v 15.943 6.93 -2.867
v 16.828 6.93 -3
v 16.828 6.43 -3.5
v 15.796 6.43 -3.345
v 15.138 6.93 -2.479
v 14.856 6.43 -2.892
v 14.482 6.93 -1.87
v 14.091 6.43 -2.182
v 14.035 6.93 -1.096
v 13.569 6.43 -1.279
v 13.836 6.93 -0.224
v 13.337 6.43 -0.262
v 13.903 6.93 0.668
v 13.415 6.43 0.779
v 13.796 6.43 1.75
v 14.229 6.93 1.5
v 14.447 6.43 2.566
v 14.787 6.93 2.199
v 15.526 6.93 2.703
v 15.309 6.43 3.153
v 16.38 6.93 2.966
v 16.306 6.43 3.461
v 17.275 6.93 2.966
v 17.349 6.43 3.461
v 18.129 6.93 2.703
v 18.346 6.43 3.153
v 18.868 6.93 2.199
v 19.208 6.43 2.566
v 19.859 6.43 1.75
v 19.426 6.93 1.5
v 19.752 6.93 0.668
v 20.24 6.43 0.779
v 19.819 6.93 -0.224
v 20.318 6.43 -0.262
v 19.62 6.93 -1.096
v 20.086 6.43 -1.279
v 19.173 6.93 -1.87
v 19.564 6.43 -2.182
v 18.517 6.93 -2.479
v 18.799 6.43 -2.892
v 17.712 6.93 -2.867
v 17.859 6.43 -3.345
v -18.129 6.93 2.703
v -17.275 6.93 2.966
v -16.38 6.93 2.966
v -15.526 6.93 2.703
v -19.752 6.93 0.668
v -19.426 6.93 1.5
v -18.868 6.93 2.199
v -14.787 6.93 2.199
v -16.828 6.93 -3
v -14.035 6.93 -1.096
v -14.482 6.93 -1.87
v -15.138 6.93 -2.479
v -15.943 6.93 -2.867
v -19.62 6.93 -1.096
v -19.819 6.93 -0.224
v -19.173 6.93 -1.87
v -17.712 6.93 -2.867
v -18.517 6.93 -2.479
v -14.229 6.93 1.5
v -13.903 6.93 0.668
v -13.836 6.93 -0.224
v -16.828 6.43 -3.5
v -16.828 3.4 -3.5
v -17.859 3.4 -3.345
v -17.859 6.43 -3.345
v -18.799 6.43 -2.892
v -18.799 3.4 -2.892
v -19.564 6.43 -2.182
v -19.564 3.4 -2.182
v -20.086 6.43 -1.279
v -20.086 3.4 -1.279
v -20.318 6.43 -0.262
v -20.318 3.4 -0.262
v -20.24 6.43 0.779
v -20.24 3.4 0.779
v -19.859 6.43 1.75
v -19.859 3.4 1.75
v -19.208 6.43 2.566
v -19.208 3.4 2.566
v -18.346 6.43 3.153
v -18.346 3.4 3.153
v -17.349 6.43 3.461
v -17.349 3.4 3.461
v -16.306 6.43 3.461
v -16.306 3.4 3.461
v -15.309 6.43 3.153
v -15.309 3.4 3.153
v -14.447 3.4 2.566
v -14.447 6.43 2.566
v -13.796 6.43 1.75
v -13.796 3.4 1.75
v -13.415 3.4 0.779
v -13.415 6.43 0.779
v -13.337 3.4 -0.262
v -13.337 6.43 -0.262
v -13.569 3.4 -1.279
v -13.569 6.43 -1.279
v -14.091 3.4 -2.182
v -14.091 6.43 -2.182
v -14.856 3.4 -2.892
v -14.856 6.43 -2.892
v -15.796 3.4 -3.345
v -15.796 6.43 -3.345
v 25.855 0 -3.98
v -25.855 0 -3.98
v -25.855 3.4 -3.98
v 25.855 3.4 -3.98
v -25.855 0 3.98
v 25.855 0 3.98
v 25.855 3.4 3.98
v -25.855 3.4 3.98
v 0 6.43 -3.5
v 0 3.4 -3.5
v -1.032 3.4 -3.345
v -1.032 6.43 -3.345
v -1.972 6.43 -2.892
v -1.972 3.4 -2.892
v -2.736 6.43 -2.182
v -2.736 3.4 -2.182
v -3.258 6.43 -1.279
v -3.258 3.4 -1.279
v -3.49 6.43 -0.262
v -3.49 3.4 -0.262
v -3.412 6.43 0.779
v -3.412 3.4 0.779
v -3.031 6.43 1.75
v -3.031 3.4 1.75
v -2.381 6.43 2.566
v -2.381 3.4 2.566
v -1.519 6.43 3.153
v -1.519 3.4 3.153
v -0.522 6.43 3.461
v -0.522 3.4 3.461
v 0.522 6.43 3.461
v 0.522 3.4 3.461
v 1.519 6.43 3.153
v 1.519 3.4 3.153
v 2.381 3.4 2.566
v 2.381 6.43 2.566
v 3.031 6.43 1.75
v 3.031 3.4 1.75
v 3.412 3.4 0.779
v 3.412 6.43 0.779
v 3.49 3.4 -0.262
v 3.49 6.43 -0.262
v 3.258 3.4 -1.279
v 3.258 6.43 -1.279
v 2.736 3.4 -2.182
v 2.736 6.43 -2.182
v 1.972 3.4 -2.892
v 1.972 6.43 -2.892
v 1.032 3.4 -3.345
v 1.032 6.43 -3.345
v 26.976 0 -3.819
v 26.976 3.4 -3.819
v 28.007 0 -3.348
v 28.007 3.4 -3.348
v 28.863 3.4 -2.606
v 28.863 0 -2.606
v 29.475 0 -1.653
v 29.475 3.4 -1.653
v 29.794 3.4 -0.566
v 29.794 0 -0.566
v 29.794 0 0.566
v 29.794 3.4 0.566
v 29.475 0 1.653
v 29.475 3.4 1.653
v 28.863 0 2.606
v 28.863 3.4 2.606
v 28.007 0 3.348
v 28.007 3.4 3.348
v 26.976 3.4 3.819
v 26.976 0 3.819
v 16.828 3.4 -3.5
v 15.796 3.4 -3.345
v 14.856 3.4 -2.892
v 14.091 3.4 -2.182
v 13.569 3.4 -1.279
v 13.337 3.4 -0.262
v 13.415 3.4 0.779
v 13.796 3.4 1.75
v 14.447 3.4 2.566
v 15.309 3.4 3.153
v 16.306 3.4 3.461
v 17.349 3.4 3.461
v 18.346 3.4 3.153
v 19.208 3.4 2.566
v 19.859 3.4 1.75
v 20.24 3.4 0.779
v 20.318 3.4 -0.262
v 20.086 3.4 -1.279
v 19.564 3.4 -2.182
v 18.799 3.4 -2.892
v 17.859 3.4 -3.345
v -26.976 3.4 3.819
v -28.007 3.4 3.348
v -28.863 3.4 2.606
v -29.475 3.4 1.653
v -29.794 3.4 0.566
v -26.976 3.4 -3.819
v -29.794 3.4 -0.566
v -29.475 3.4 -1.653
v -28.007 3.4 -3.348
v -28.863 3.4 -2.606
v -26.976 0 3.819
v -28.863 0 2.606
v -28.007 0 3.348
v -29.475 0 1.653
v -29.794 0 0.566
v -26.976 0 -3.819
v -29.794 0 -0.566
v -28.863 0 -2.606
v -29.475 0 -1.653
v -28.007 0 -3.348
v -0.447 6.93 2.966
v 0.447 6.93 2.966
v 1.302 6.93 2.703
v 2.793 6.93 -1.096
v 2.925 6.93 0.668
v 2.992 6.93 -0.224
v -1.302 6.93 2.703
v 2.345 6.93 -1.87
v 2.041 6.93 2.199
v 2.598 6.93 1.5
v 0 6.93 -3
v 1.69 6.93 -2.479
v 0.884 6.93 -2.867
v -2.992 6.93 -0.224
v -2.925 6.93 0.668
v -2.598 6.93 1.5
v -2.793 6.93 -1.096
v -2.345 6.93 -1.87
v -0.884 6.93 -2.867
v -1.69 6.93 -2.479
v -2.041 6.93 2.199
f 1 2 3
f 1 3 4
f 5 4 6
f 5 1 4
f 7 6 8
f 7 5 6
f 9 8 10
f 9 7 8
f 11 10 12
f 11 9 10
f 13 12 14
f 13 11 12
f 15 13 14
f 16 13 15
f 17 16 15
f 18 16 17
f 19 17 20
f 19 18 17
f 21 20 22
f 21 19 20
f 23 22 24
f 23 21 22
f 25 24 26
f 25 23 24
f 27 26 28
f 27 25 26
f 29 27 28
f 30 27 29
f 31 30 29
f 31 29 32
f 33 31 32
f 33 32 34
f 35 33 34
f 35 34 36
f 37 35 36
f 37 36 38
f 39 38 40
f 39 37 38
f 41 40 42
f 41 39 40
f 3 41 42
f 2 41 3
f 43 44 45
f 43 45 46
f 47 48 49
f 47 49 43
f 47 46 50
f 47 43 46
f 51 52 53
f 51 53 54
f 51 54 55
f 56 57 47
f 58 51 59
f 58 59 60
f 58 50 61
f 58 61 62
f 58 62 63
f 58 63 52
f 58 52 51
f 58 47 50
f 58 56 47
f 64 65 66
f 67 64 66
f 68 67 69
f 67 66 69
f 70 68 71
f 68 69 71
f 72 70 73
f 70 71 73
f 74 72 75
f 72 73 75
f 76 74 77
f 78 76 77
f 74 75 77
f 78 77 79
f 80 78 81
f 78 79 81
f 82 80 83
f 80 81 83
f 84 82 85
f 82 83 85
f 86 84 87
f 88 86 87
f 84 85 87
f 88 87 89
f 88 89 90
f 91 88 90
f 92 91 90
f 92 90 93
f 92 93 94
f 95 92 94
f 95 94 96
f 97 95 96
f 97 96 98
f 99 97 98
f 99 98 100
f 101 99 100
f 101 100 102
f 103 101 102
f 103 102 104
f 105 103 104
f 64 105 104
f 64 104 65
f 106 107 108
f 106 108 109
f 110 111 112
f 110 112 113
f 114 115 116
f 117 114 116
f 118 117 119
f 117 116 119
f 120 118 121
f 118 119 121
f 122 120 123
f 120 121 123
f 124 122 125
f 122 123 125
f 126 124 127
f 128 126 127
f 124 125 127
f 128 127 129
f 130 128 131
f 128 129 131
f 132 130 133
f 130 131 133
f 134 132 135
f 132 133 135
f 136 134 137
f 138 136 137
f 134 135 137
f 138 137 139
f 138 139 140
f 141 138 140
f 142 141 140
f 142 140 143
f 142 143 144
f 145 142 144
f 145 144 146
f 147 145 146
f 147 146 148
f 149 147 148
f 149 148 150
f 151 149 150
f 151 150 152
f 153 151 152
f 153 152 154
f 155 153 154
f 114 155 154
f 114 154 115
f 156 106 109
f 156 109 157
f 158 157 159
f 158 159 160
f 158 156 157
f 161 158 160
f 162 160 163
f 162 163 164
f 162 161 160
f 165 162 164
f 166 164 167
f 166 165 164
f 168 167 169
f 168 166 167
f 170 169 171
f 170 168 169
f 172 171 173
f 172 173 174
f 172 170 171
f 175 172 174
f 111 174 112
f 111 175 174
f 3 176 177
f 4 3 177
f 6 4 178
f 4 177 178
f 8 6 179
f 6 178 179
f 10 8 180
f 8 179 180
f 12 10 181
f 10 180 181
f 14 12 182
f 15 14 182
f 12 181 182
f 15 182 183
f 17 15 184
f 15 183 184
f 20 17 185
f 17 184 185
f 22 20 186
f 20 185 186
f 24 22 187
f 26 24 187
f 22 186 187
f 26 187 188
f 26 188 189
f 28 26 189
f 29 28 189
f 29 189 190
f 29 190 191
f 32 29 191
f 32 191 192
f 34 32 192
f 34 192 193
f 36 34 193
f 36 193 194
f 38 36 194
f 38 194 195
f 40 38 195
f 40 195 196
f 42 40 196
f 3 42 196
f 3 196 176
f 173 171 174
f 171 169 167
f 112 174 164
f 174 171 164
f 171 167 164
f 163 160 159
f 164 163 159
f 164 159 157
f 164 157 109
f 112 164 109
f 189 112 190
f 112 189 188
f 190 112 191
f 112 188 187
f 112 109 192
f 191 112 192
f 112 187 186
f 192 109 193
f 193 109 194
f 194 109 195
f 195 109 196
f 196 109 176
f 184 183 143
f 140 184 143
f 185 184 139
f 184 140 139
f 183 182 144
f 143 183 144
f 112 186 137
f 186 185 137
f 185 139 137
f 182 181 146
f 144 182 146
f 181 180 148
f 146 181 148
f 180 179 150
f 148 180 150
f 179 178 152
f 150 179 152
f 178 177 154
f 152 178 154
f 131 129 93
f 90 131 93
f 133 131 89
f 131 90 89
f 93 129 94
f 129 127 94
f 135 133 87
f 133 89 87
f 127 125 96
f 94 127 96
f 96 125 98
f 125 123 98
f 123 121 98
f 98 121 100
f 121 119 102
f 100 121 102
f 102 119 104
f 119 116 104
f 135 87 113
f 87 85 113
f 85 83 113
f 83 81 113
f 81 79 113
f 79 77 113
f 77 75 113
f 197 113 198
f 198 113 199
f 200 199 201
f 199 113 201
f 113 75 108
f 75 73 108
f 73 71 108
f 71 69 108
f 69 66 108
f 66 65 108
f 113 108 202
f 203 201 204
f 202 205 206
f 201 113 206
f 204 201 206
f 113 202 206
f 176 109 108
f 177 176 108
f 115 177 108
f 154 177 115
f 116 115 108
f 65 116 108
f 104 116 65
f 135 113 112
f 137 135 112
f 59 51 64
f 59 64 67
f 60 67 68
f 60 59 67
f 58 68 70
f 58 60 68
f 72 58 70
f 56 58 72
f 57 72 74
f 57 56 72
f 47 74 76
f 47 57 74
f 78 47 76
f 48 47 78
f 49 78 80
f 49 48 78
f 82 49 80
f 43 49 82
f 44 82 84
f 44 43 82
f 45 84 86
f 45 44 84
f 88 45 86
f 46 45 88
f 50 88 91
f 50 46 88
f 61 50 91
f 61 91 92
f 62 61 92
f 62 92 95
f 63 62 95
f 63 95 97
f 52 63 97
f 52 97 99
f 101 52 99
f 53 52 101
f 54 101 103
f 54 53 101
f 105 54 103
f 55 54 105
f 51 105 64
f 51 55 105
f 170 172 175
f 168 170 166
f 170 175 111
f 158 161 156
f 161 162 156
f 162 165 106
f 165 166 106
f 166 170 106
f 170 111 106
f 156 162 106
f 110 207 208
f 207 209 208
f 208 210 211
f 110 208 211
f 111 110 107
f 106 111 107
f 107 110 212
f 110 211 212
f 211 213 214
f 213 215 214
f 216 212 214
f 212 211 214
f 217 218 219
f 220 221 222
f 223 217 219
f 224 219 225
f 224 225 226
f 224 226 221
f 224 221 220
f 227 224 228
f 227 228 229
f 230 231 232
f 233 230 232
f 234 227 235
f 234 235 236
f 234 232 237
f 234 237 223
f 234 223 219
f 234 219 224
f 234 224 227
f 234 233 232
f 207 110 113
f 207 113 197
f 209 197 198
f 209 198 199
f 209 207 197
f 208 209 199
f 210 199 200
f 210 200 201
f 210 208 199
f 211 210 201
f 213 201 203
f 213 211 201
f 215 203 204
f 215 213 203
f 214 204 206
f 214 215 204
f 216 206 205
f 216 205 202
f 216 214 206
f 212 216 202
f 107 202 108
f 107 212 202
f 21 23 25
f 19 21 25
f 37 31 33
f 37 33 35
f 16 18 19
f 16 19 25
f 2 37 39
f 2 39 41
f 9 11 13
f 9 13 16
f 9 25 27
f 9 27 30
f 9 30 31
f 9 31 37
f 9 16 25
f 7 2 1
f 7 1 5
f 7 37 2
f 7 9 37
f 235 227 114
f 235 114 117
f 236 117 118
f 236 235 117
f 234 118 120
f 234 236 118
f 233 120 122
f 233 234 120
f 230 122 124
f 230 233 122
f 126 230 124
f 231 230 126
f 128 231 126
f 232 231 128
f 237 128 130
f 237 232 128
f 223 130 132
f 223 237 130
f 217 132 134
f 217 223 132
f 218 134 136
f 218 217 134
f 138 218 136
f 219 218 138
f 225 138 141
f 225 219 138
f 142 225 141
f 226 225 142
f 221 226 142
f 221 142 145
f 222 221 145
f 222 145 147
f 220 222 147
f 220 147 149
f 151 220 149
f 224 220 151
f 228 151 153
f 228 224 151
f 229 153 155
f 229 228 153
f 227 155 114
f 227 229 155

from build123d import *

# Parameters (mm, degrees)
BOSS_EXTRUDE1_DEPTH = 3.4
SKETCH1_3_R         = 3.5
BOSS_EXTRUDE2_DEPTH = 6.93
CHAMFER1_SIZE       = 0.5
SKETCH1_4_R         = 3.5
BOSS_EXTRUDE3_DEPTH = 6.93
CHAMFER2_SIZE       = 0.5


with BuildPart() as part:
    # Sketch1 → Boss-Extrude1 (new body)
    with BuildSketch(Plane(origin=(0, 0, 0), x_dir=(1, 0, 0), z_dir=(0, 1, 0))):
        with BuildLine():
            Line((-25.855, 3.98), (25.855, 3.98))
            ThreePointArc((25.855, 3.98), (29.835, 0), (25.855, -3.98))
            Line((25.855, -3.98), (-25.855, -3.98))
            ThreePointArc((-25.855, -3.98), (-29.835, 0), (-25.855, 3.98))
        make_face()
    extrude(amount=BOSS_EXTRUDE1_DEPTH)

    # Sketch1<3> → Boss-Extrude2 (add)
    with BuildSketch(Plane(origin=(0, 0, 0), x_dir=(1, 0, 0), z_dir=(0, 1, 0))):
        with Locations(Location((-16.8275, 0, 0), (0, 0, 90))):
            Circle(SKETCH1_3_R)
        with Locations(Location((16.8275, 0, 0), (0, 0, 90))):
            Circle(SKETCH1_3_R)
    extrude(amount=BOSS_EXTRUDE2_DEPTH)

    # Chamfer1
    chamfer1_edges = [part.edges().sort_by_distance(p)[0] for p in [
        (-16.8275, 6.93, 3.5),
        (16.8275, 6.93, 3.5),
    ]]
    chamfer(chamfer1_edges, length=CHAMFER1_SIZE)

    # Sketch1<4> → Boss-Extrude3 (add)
    with BuildSketch(Plane(origin=(0, 0, 0), x_dir=(1, 0, 0), z_dir=(0, 1, 0))):
        with Locations(Location((0, 0, 0), (0, 0, 90))):
            Circle(SKETCH1_4_R)
    extrude(amount=BOSS_EXTRUDE3_DEPTH)

    # Chamfer2
    chamfer2_edges = [part.edges().sort_by_distance(p)[0] for p in [
        (0, 6.93, 3.5),
    ]]
    chamfer(chamfer2_edges, length=CHAMFER2_SIZE)


solid = part.part
